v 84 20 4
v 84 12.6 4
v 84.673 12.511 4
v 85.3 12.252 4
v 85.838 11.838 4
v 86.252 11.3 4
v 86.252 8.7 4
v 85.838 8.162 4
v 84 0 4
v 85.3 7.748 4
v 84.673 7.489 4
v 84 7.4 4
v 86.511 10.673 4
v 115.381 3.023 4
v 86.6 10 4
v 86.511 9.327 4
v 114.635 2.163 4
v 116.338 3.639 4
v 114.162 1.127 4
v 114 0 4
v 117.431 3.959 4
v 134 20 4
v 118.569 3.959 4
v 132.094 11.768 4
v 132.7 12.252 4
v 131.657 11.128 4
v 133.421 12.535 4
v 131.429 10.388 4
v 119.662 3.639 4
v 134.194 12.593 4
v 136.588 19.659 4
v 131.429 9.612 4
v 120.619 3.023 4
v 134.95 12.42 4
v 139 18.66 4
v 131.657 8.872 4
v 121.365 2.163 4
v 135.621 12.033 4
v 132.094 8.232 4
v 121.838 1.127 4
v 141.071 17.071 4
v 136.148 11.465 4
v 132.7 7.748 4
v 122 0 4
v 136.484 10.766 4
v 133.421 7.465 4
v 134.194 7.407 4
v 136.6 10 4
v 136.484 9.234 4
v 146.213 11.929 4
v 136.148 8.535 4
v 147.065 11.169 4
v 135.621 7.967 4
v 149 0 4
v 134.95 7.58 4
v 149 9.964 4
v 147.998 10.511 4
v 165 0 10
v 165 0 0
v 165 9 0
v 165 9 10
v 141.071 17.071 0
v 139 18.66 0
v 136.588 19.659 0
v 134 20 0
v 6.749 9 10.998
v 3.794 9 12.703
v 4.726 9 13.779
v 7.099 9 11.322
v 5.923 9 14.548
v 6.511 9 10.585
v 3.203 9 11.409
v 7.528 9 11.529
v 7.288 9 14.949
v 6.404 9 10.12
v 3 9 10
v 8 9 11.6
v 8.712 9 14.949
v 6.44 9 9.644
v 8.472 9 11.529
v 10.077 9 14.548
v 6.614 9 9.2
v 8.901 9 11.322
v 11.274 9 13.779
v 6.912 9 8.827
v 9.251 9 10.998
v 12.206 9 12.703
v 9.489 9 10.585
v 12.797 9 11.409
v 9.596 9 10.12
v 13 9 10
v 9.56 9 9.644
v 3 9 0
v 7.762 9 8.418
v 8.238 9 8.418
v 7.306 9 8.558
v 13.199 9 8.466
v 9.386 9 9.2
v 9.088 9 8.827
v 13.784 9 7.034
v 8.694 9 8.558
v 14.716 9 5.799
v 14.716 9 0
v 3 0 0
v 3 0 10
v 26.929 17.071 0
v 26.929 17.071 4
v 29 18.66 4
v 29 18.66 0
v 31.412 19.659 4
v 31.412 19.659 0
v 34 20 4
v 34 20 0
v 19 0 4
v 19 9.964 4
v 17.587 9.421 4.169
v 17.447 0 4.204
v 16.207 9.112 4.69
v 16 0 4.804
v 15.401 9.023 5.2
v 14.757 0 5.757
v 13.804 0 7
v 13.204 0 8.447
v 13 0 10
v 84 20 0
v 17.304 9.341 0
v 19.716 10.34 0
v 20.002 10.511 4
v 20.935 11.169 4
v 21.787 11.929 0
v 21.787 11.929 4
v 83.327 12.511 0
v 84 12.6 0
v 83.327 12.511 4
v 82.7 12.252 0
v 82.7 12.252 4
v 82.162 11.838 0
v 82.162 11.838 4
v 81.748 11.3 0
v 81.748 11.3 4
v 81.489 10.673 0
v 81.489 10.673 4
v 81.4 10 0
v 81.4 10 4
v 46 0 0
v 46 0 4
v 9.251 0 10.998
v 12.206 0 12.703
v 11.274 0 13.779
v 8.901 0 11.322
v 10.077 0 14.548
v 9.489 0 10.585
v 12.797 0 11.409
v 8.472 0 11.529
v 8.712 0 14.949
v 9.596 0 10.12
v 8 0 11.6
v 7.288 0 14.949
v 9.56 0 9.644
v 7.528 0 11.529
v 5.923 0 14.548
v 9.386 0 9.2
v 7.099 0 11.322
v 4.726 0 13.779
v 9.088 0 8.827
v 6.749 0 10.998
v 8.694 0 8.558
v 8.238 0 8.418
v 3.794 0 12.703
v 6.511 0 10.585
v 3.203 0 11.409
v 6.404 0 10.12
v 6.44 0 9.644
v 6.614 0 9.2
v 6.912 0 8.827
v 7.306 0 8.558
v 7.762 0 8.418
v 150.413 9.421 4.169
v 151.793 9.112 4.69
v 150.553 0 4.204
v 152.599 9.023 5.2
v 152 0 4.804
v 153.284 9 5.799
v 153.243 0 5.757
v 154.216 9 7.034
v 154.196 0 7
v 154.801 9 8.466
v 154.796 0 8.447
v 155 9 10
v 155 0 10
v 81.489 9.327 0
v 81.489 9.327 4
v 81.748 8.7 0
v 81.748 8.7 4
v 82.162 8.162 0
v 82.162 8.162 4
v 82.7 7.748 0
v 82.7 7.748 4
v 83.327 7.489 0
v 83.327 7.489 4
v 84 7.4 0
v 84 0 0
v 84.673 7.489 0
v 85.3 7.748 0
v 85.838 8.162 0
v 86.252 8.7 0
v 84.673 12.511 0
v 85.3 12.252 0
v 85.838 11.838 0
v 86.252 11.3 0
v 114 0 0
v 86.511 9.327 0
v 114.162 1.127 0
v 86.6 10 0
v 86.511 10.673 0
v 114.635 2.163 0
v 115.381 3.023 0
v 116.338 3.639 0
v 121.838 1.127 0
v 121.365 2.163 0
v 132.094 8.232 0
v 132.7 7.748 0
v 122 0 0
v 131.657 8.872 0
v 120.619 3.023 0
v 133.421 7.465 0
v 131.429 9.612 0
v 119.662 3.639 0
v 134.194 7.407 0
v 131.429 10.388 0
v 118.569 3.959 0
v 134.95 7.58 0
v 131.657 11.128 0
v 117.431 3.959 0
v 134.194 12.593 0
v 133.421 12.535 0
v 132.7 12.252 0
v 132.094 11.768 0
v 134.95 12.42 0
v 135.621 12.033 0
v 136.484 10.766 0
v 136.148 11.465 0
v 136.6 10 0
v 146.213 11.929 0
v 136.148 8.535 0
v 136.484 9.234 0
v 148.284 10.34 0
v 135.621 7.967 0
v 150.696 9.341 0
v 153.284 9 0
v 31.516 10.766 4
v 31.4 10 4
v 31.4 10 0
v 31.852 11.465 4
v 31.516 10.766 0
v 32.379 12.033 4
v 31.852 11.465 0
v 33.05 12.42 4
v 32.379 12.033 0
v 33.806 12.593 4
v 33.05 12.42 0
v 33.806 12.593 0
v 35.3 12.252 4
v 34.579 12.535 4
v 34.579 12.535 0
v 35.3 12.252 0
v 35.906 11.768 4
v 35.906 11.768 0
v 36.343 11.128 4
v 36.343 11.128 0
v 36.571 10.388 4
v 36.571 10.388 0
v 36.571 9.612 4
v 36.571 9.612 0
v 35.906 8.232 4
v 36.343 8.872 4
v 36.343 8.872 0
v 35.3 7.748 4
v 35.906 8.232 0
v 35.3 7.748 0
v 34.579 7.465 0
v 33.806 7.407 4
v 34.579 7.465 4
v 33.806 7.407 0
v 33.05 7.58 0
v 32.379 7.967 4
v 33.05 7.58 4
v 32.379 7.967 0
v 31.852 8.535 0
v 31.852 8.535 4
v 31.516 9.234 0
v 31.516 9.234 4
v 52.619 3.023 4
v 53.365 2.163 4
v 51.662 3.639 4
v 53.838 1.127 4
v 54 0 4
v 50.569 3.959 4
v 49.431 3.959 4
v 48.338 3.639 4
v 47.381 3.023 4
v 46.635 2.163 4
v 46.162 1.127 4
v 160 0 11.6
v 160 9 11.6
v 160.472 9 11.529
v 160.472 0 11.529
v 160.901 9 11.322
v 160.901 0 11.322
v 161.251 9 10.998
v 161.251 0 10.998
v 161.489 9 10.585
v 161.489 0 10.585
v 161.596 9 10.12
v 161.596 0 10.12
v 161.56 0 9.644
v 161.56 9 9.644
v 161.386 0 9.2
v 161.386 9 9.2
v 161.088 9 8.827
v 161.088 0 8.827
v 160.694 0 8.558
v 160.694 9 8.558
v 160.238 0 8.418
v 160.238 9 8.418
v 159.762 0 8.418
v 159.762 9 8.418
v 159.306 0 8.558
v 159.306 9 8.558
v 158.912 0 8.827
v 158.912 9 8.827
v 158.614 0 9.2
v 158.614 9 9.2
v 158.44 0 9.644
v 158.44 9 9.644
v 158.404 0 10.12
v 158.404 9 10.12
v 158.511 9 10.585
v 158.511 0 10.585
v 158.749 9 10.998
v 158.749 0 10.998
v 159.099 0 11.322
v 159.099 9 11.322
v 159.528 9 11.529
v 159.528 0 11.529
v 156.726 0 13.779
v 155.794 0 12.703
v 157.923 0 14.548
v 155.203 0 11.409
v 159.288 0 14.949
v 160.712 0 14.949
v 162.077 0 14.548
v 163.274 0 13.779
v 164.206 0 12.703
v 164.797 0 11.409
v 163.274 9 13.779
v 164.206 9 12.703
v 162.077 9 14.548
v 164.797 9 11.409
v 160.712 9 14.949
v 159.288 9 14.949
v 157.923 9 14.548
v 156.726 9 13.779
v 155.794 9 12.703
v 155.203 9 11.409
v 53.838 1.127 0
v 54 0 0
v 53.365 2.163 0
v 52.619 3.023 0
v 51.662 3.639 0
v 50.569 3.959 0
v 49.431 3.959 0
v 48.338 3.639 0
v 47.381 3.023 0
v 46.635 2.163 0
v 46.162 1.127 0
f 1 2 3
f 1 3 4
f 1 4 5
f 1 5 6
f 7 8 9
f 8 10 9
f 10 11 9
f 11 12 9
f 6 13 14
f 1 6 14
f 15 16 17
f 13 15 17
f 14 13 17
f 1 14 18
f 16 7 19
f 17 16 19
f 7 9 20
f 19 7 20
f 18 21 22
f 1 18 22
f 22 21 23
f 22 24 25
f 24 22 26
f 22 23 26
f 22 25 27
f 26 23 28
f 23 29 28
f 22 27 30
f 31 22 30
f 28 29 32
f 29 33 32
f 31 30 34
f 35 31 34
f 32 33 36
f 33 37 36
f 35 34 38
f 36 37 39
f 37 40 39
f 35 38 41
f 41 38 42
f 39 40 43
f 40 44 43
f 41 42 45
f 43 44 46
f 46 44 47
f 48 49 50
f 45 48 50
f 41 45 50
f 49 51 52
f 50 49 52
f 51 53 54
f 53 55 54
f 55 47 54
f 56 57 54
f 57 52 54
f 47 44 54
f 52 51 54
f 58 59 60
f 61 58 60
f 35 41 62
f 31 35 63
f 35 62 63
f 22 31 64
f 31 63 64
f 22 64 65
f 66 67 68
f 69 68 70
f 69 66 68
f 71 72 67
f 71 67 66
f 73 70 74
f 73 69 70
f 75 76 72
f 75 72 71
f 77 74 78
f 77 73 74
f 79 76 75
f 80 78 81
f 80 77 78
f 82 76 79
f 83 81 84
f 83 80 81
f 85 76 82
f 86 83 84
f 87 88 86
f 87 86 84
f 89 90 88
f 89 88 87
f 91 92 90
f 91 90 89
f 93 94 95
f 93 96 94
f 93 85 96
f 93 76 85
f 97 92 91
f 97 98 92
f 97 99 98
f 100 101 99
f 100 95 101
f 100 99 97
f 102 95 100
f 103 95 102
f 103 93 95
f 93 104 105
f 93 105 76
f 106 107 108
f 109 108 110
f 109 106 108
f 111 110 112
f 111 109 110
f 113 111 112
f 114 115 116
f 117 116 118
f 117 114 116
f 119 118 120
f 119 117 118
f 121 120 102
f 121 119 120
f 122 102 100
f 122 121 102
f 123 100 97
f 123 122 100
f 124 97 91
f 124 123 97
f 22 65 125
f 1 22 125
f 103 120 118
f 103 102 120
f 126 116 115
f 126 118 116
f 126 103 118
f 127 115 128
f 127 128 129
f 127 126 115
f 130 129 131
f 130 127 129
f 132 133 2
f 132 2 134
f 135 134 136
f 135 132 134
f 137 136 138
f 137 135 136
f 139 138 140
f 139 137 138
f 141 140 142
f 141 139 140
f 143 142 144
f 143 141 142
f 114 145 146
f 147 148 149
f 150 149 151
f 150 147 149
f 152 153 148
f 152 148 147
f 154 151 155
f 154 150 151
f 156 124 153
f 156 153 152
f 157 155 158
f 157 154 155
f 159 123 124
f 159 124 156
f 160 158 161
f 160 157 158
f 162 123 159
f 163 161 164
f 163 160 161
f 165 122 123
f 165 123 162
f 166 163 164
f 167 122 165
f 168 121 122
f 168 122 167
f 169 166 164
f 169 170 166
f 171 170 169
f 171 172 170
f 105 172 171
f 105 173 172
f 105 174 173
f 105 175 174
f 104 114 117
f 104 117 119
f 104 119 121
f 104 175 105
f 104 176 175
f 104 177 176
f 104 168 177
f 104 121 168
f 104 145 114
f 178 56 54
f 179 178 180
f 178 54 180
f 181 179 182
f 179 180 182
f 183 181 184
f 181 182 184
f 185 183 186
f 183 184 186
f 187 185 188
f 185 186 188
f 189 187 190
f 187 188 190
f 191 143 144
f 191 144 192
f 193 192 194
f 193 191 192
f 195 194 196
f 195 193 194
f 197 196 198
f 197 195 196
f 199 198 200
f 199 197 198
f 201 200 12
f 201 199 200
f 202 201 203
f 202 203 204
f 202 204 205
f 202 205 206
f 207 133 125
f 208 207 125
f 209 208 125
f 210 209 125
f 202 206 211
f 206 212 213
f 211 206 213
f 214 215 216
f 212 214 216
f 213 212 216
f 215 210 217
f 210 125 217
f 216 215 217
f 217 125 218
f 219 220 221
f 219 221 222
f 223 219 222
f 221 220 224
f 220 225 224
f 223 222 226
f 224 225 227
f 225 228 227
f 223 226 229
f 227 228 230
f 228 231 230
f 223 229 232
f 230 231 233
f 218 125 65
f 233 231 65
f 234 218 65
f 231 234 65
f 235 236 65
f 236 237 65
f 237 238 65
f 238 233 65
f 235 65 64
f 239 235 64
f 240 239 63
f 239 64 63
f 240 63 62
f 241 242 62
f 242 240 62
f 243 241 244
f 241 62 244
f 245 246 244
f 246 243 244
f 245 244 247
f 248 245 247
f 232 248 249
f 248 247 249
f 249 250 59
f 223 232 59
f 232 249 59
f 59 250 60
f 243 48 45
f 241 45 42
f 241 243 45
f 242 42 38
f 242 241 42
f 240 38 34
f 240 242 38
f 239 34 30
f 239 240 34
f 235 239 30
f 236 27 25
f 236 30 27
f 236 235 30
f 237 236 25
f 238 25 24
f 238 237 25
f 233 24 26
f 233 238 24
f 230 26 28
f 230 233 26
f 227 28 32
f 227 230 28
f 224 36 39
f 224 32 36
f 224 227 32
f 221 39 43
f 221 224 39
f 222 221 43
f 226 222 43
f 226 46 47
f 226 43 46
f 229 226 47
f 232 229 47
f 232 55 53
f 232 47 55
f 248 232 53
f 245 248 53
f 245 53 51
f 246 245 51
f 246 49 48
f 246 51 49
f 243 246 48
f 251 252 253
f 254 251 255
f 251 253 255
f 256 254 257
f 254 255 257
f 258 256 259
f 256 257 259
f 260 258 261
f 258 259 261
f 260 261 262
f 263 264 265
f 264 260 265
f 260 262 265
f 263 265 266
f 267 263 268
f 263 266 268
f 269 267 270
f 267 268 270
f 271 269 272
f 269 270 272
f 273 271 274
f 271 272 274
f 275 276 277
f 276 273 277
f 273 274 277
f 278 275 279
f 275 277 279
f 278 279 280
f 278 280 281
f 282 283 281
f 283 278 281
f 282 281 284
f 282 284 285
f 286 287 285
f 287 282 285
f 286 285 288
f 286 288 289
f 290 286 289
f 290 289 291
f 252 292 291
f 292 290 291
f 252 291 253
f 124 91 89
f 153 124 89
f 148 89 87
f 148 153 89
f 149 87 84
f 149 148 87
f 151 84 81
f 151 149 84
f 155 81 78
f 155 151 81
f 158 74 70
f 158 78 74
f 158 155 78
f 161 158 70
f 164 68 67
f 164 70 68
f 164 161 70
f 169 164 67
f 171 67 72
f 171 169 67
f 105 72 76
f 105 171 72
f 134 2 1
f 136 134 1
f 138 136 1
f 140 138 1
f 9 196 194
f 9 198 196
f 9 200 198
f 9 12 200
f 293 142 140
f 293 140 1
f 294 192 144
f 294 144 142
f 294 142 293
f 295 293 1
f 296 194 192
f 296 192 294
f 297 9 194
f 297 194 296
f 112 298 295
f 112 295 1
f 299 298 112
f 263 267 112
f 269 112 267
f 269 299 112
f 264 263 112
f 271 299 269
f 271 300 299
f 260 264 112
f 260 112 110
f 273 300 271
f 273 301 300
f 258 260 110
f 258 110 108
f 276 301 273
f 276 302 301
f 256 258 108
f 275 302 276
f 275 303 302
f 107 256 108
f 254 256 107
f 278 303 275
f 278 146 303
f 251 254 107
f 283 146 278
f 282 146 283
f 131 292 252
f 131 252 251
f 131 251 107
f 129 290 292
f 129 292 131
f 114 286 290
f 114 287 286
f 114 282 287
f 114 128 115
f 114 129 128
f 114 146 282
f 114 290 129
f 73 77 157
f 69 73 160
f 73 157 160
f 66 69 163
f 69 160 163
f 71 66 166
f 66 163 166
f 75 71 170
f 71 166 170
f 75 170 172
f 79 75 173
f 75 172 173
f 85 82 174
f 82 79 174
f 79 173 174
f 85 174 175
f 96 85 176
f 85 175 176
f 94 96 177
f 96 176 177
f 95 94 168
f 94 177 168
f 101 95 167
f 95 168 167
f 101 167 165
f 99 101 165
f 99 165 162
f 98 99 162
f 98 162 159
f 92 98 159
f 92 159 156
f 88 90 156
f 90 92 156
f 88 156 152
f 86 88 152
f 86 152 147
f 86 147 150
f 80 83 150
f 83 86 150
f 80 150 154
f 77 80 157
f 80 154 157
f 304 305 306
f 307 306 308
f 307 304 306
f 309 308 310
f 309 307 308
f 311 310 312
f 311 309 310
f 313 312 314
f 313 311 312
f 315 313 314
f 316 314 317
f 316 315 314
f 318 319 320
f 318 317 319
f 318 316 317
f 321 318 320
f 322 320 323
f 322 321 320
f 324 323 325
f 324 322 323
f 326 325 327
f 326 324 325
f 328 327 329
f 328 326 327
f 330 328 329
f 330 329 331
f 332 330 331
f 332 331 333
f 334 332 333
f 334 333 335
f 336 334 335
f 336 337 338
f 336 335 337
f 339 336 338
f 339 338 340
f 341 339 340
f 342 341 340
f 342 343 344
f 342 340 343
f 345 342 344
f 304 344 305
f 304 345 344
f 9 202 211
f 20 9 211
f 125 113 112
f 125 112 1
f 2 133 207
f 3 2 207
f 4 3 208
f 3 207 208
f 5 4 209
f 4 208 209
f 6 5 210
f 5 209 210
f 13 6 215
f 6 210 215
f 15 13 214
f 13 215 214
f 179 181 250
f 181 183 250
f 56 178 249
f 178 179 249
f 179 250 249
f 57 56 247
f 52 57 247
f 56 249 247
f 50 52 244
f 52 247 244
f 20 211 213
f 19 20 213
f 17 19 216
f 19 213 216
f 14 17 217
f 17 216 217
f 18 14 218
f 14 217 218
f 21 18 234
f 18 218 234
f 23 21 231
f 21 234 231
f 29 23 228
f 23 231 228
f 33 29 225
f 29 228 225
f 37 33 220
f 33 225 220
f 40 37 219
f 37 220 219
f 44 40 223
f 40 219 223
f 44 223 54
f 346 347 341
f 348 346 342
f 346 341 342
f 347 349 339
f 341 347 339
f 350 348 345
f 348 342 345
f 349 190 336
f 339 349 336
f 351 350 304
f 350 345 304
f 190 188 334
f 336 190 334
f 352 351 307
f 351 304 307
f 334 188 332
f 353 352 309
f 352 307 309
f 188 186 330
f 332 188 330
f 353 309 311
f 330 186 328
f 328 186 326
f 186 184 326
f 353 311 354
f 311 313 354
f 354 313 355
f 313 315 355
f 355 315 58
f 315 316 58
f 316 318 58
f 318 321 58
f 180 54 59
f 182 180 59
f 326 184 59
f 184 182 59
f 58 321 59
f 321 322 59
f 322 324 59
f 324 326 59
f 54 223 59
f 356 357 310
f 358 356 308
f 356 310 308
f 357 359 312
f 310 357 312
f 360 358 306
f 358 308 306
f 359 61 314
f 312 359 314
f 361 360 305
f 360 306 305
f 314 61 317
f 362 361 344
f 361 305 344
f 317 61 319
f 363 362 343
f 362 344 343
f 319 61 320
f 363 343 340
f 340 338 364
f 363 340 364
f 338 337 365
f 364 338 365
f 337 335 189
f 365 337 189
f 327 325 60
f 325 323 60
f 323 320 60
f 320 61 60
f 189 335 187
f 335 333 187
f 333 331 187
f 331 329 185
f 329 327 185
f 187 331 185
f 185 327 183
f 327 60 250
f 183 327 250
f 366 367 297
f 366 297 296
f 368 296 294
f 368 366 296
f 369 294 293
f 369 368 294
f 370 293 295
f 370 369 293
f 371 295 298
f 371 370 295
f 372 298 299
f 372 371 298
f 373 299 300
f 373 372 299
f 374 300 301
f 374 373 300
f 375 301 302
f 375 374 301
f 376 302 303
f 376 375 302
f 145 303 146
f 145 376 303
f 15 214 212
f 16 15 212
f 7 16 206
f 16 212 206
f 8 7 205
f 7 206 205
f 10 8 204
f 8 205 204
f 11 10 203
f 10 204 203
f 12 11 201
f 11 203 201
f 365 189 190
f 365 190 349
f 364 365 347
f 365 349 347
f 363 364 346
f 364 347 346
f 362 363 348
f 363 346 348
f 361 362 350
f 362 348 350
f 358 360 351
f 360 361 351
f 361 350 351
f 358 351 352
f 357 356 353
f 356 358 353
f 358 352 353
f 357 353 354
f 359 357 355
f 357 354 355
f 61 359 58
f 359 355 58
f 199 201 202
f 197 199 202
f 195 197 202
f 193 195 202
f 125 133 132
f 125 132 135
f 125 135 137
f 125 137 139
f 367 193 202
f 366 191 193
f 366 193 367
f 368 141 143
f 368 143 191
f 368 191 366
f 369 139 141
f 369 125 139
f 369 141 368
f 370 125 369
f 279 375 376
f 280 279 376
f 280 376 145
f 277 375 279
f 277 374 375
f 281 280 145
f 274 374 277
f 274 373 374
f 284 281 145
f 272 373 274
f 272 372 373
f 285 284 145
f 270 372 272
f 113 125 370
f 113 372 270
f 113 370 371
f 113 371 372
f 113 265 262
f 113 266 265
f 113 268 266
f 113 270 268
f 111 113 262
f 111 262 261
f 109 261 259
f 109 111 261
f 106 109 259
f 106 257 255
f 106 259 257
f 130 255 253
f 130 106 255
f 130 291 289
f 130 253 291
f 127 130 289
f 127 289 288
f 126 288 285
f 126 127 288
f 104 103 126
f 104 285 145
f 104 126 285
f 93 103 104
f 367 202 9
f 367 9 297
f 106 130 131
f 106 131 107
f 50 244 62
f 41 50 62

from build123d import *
from build123d.topology import SkipClean

# Parameters (mm, degrees)
SKETCH1_R           = 1.6
BOSS_EXTRUDE1_DEPTH = 20
SKETCH3_R           = 2.6
BOSS_EXTRUDE2_DEPTH = 15


with BuildPart() as part:
    # Sketch1 → Boss-Extrude1 (new body)
    with BuildSketch(Plane(origin=(0, 0, 0), x_dir=(1, 0, 0), z_dir=(0, 1, 0))):
        with BuildLine():
            Line((165, -10), (165, 0))
            Line((165, 0), (84, 0))
            Line((84, 0), (84, -4))
            Line((84, -4), (149, -4))
            ThreePointArc((149, -4), (153.242640687, -5.757359313), (155, -10))
            ThreePointArc((155, -10), (160, -15), (165, -10))
        make_face()
        with Locations(Location((160, -10, 0), (0, 0, 270))):
            Circle(SKETCH1_R, mode=Mode.SUBTRACT)
    extrude(amount=BOSS_EXTRUDE1_DEPTH)


with BuildPart() as body_2:
    # Sketch3 → Boss-Extrude2 (new, through all)
    with BuildSketch(Plane.XY):
        with BuildLine():
            Line((122, 0), (165, 0))
            Line((165, 0), (165, 9))
            Line((165, 9), (153.284271247, 9))
            ThreePointArc((153.284271247, 9), (149.457436924, 9.761204675), (146.213203436, 11.928932188))
            Line((146.213203436, 11.928932188), (141.071067812, 17.071067812))
            ThreePointArc((141.071067812, 17.071067812), (137.826834324, 19.238795325), (134, 20))
            Line((134, 20), (84, 20))
            Line((84, 20), (84, 12.6))
            ThreePointArc((84, 12.6), (85.838477631, 11.838477631), (86.6, 10))
            ThreePointArc((86.6, 10), (85.838477631, 8.161522369), (84, 7.4))
            Line((84, 7.4), (84, 0))
            Line((84, 0), (114, 0))
            ThreePointArc((114, 0), (118, 4), (122, 0))
        make_face()
        with Locations((134, 10)):
            Circle(SKETCH3_R, mode=Mode.SUBTRACT)
    extrude(amount=BOSS_EXTRUDE2_DEPTH)

    # Intersect1: read off the stored shape, not the designer's step
    # Intersect1: intersect part
    add(part.part, mode=Mode.INTERSECT)

    # Mirror1: body 2 across face


with BuildPart() as body_2_1:
    with SkipClean():  # the faces are left unmerged after this step: merging them gives an invalid solid
        add(body_2.part)
        add(body_2.part.mirror(Plane(origin=(84, 16.3, 2), x_dir=(0, 0, 1), z_dir=(-1, 0, 0))))


solid = body_2_1.part
